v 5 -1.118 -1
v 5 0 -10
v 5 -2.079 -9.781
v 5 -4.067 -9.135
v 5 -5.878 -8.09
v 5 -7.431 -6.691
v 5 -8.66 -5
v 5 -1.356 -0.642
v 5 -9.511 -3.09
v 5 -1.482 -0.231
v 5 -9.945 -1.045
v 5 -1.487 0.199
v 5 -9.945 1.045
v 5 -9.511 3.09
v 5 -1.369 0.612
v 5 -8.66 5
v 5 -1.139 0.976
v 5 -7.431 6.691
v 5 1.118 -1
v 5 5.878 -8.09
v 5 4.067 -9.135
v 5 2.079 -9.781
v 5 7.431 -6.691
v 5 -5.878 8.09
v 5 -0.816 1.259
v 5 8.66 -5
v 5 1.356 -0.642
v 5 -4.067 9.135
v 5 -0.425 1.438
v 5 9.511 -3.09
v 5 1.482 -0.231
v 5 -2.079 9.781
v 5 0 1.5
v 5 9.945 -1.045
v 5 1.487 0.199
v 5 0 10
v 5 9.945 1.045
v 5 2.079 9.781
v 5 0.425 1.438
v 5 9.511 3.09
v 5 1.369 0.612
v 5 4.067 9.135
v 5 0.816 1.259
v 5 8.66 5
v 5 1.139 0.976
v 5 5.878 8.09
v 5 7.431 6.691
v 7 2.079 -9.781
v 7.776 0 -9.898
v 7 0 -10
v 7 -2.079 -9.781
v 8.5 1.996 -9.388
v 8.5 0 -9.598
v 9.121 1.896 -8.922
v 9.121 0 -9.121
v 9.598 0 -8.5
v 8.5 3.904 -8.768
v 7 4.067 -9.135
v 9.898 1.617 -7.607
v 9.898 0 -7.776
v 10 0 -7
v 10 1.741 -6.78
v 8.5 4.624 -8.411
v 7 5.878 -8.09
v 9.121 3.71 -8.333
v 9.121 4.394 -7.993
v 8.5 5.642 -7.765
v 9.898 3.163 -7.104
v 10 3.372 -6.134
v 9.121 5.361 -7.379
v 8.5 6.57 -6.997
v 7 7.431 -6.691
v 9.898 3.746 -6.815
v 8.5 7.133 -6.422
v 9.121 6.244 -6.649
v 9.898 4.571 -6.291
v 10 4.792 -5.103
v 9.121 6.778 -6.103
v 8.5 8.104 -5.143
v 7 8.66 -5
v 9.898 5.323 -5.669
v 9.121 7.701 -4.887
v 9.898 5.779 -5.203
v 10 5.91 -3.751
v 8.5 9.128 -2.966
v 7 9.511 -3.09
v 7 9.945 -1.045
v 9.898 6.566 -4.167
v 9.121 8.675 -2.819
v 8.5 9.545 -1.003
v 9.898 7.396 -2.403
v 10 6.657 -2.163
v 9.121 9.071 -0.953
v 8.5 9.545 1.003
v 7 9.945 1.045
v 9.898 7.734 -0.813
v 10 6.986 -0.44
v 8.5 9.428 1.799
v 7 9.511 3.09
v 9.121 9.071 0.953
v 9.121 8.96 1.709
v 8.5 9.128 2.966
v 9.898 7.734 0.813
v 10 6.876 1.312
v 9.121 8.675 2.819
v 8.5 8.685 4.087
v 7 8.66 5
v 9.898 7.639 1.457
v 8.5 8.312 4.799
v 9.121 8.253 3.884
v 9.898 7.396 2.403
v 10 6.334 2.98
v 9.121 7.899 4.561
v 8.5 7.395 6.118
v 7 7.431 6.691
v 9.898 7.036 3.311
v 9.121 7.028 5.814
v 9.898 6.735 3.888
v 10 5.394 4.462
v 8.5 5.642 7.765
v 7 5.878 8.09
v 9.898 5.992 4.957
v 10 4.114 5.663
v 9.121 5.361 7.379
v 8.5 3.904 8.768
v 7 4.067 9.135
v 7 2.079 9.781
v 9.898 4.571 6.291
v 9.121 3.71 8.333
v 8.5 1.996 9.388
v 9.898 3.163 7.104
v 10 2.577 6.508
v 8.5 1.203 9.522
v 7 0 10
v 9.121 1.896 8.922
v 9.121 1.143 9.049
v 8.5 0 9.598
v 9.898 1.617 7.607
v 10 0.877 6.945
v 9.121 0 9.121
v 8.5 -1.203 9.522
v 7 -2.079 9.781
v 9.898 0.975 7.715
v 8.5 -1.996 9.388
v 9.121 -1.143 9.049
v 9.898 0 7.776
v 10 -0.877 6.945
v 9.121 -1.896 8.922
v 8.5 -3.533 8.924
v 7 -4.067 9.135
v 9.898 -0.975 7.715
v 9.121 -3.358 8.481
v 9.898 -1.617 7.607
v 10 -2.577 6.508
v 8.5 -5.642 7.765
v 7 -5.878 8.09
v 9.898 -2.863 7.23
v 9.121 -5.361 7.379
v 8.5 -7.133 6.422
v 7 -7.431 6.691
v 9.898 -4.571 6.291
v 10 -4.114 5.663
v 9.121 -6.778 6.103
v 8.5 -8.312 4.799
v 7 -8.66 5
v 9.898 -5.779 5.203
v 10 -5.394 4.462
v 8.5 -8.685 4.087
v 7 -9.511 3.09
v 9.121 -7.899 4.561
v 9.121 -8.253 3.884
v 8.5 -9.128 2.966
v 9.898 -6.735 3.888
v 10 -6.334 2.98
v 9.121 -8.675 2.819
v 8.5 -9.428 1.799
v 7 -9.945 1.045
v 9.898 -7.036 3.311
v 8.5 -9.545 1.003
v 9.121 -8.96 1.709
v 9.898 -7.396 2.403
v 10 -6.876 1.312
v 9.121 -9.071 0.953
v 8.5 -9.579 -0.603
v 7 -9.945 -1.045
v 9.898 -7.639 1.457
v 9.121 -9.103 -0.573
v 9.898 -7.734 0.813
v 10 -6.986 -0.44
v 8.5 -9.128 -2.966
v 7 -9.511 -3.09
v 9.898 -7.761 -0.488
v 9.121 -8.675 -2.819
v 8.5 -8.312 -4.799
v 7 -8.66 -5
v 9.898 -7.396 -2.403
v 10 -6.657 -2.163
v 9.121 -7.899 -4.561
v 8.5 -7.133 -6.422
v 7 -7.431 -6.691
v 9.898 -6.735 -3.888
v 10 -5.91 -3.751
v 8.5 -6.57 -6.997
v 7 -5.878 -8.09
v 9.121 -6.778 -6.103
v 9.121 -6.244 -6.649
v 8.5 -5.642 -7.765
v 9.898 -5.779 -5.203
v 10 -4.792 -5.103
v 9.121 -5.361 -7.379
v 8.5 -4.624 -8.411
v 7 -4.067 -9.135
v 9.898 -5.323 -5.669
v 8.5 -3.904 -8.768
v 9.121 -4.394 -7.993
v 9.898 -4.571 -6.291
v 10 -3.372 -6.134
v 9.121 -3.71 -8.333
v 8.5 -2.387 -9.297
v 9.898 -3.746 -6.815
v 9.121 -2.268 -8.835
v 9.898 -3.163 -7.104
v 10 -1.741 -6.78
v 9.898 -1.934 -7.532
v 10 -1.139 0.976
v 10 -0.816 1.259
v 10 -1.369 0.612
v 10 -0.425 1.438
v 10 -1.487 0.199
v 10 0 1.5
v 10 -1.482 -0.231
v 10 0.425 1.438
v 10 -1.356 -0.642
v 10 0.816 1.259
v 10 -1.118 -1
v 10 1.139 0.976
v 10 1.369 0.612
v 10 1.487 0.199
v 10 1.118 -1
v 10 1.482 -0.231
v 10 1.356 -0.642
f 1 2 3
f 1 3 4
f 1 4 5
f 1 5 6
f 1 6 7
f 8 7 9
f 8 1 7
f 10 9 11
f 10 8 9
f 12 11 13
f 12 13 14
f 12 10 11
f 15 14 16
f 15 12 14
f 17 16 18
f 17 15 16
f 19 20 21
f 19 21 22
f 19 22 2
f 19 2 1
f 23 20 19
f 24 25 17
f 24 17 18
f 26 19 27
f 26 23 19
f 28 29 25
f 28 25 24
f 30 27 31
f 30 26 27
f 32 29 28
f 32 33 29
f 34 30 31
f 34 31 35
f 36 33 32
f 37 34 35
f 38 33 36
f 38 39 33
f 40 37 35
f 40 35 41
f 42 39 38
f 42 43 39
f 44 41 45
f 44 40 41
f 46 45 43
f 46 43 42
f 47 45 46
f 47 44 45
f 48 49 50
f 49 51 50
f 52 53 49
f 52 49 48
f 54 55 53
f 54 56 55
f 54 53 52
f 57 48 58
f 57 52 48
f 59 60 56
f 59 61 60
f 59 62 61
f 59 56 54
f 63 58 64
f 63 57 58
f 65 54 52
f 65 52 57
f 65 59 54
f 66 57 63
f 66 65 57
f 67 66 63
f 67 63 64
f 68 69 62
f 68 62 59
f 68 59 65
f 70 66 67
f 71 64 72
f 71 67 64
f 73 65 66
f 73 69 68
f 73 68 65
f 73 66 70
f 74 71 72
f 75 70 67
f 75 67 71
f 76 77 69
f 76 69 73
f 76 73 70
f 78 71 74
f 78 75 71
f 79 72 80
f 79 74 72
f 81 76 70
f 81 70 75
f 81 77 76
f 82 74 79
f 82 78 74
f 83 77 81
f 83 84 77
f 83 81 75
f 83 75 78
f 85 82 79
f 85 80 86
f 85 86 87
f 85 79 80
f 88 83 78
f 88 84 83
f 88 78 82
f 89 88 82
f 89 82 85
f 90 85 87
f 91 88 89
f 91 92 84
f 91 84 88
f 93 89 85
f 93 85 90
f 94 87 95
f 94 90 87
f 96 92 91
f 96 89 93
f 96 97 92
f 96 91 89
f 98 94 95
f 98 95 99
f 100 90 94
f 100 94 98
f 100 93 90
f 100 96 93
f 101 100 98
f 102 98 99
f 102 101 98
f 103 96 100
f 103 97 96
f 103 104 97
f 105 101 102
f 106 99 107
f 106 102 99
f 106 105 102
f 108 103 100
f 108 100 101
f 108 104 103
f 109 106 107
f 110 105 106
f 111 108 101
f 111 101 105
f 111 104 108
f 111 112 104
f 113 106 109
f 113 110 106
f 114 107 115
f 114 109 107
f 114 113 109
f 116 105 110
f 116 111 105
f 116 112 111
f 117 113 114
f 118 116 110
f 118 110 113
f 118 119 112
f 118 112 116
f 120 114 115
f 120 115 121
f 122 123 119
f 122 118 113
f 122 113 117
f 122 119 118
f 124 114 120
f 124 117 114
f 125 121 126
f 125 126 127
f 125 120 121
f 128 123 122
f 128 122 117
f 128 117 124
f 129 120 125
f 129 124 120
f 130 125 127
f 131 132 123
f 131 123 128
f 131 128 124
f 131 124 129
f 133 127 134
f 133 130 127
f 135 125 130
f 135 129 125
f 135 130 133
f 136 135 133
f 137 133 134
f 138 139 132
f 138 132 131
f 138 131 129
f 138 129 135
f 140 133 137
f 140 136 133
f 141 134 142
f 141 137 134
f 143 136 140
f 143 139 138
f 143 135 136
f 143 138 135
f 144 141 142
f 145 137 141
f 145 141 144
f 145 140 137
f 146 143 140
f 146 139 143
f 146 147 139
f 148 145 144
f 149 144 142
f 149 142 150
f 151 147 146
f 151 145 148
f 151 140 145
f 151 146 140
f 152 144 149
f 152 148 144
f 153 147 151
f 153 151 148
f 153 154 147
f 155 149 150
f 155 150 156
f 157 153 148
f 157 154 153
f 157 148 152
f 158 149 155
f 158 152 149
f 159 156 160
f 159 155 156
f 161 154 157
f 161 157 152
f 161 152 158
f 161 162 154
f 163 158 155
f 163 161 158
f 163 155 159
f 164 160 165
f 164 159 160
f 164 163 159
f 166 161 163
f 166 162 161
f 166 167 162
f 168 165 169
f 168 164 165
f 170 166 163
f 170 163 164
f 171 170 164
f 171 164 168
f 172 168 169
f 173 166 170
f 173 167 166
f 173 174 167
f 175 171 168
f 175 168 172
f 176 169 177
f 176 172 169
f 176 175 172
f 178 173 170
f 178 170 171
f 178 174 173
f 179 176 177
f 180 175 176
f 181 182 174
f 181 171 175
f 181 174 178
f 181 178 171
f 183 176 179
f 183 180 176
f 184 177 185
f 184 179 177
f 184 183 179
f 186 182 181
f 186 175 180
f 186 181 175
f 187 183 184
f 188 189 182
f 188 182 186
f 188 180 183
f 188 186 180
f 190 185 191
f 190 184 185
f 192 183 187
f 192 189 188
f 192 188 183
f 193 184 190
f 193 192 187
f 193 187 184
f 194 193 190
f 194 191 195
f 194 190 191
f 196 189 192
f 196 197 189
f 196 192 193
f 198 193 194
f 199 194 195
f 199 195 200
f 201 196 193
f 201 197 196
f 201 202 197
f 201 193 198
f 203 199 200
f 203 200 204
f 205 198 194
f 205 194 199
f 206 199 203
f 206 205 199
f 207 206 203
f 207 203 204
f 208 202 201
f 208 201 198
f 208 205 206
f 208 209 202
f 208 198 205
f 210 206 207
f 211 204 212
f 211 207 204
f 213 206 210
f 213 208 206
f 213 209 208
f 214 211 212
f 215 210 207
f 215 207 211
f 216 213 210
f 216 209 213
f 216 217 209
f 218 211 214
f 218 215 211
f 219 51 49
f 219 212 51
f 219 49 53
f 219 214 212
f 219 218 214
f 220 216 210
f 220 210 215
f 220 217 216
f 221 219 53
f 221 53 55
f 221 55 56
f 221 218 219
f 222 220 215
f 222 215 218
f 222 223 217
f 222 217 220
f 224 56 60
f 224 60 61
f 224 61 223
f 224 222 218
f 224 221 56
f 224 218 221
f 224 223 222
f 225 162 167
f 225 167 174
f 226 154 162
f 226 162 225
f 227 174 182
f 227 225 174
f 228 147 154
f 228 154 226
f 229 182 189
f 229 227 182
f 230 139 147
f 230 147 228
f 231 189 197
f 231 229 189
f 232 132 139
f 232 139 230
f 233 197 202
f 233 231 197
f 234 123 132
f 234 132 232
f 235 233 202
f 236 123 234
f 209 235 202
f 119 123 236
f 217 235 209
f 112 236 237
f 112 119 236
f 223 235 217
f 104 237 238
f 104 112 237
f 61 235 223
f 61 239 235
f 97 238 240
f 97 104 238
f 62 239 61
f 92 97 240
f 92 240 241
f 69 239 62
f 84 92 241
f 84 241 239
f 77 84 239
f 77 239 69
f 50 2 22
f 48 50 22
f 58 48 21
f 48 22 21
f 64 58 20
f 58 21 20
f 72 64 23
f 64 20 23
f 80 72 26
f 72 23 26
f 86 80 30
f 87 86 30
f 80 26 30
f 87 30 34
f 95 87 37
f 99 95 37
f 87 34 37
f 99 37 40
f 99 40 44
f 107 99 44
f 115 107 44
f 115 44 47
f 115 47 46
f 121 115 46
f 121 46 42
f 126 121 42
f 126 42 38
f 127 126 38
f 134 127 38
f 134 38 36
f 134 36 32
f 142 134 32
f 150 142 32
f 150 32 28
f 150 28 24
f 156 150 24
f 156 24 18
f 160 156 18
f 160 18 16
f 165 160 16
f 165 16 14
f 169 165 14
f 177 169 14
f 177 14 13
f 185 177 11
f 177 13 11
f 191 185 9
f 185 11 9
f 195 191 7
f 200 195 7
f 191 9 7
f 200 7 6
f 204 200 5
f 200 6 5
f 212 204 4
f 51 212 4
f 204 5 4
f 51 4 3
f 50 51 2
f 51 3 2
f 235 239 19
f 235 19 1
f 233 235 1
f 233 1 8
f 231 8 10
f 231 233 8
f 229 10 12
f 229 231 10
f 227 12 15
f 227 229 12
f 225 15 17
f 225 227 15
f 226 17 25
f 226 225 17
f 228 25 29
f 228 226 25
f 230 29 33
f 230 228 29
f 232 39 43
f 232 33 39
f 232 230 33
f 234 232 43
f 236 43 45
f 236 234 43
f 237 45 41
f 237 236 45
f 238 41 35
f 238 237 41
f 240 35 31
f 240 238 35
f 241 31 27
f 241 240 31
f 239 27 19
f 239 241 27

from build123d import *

# Parameters (mm, degrees)
SKETCH1_R           = 10
BOSS_EXTRUDE1_DEPTH = 10
CUT_EXTRUDE1_DEPTH  = 18.320508076
FILLET1_R           = 3


with BuildPart() as part:
    # Sketch1 → Boss-Extrude1 (new body)
    with BuildSketch(Plane(origin=(0, 0, 0), x_dir=(0, -1, 0), z_dir=(1, 0, 0))):
        with Locations(Location((0, 0, 0), (0, 0, 90))):
            Circle(SKETCH1_R)
    extrude(amount=BOSS_EXTRUDE1_DEPTH)

    # Sketch2 → Cut-Extrude1 (cut, through all)
    with BuildSketch(Plane(origin=(10, 0, 0), x_dir=(0, -1, 0), z_dir=(1, 0, 0))):
        with BuildLine():
            Line((-1.118033989, 1), (1.118033989, 1))
            ThreePointArc((1.118033989, 1), (0, -1.5), (-1.118033989, 1))
        make_face()
    extrude(amount=-CUT_EXTRUDE1_DEPTH, mode=Mode.SUBTRACT)

    # Fillet1
    fillet1_edges = [part.edges().sort_by_distance(p)[0] for p in [
        (0, 0, 10),
        (10, 0, 10),
    ]]
    fillet(fillet1_edges, radius=FILLET1_R)

    # SurfaceCut1
    split(bisect_by=Plane.ZY.offset(-5), keep=Keep.BOTTOM)


solid = part.part
